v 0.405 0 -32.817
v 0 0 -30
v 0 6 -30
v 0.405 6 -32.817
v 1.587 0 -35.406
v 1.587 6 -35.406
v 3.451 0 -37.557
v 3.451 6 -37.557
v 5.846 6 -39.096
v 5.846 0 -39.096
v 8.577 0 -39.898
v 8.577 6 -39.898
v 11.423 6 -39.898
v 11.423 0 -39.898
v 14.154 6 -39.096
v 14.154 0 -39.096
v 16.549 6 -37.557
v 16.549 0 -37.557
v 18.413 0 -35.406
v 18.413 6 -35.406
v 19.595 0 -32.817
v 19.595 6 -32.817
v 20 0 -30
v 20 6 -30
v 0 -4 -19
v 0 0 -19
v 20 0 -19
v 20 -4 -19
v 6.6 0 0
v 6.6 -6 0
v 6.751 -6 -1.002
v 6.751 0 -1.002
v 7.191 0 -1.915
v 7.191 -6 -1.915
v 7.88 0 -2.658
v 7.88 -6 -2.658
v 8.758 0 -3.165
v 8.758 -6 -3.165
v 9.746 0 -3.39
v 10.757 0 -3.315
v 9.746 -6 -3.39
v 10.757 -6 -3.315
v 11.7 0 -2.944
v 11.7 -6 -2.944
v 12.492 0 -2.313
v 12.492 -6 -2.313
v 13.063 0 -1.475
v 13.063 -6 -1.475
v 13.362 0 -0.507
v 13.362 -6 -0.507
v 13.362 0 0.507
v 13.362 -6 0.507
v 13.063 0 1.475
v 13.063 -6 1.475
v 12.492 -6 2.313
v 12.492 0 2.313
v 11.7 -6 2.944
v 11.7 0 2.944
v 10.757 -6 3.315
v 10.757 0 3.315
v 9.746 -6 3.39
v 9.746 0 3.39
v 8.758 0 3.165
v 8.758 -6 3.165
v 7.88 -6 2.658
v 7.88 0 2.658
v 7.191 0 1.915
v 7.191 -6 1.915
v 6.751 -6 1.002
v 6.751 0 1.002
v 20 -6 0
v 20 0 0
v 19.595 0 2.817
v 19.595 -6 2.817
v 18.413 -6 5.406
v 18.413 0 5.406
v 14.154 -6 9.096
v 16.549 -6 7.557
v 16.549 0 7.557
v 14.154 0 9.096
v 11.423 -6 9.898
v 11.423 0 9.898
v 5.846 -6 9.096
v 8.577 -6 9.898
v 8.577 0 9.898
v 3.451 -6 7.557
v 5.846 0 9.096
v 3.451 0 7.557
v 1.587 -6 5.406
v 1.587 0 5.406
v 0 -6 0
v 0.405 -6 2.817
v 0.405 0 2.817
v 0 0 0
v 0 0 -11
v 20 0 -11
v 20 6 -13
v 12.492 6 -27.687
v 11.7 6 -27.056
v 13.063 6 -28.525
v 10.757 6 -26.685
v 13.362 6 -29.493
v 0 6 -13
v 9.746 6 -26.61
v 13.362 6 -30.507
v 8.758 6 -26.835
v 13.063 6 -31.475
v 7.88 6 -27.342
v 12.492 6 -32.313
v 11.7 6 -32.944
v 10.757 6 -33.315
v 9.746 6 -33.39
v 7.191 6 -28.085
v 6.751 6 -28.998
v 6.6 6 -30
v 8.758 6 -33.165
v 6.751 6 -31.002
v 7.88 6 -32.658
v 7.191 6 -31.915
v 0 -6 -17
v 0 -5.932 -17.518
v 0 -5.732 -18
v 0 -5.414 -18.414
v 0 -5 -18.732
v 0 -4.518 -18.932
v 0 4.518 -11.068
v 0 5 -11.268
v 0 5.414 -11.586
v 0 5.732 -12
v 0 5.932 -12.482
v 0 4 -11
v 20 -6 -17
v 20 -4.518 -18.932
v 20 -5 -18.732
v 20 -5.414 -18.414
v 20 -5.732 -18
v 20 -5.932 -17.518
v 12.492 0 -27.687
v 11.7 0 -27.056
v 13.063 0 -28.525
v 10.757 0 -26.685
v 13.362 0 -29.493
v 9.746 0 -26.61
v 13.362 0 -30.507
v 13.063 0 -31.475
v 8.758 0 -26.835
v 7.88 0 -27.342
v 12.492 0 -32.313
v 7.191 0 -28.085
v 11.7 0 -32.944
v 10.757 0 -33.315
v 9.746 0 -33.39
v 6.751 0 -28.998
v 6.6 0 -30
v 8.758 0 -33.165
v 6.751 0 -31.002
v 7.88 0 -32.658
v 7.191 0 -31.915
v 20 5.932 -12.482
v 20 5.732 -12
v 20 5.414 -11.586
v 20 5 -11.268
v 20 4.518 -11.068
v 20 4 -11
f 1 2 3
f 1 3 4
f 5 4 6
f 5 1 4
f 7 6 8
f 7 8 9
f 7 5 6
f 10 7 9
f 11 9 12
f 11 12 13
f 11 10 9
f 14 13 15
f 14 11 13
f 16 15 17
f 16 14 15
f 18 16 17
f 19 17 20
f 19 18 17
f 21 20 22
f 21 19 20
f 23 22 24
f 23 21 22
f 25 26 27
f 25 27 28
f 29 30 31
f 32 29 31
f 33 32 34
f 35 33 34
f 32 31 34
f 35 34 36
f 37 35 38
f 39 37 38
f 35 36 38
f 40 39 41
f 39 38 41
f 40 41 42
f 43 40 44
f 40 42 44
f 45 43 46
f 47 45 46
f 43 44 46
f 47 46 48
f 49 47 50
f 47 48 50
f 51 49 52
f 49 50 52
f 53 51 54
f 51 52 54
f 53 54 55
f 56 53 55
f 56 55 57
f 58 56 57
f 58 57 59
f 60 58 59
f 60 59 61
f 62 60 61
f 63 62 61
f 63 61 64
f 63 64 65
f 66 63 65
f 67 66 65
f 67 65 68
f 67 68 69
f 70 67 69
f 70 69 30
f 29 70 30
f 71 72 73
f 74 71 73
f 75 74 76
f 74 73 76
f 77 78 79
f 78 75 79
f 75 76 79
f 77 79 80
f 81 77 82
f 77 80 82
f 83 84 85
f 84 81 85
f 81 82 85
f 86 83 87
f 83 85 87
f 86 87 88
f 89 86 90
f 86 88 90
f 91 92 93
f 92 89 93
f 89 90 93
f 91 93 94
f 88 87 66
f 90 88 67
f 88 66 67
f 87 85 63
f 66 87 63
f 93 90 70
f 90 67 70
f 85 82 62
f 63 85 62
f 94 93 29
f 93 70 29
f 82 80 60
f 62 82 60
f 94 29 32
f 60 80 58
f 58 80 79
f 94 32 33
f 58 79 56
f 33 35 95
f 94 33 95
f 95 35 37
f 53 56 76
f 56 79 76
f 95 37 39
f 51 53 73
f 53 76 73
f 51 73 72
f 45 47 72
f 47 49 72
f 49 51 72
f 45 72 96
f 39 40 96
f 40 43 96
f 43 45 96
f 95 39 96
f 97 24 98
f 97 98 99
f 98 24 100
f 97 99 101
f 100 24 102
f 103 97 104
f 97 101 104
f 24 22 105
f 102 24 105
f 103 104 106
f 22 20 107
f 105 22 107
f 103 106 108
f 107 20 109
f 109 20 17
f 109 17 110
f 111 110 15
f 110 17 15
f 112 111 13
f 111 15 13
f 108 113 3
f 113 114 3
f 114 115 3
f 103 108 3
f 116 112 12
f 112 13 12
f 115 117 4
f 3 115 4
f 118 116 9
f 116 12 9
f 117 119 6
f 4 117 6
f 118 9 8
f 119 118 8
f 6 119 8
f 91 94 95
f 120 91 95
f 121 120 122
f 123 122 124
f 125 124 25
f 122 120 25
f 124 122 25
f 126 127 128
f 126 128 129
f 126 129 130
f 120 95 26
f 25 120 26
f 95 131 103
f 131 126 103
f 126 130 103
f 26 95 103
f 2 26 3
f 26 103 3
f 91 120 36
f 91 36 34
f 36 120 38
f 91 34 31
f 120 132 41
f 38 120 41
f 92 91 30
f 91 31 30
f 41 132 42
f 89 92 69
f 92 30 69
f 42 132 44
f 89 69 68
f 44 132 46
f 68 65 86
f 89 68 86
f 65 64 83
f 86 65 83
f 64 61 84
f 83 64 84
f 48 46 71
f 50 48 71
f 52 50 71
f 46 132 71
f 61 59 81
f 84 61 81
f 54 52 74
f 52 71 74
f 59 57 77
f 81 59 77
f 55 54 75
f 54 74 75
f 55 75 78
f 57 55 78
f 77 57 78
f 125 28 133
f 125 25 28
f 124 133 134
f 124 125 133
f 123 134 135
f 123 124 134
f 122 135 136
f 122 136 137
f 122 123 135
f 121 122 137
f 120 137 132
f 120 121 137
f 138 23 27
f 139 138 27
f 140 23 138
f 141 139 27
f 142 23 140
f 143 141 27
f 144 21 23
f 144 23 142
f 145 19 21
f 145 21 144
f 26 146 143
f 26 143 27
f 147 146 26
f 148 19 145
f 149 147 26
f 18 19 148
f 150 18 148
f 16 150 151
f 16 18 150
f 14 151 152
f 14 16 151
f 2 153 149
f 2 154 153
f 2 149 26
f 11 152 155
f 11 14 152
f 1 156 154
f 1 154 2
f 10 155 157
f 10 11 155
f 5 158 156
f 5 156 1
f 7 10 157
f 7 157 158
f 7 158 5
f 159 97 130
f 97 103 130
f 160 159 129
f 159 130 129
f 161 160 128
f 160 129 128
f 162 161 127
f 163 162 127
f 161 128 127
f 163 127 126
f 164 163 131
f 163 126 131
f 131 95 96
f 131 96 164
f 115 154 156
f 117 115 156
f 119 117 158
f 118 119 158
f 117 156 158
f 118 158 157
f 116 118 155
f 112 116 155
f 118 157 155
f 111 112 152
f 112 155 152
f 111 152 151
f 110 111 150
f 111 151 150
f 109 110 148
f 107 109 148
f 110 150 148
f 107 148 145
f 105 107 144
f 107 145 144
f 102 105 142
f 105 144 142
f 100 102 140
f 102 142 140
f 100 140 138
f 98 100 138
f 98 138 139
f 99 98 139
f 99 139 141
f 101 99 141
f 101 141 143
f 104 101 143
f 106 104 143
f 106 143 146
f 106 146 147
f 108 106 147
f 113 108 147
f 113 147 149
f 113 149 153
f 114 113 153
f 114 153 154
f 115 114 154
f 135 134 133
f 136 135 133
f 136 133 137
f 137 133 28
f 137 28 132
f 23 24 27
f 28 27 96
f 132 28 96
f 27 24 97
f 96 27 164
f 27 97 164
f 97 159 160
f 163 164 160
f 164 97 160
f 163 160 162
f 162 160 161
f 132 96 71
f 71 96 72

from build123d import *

# Parameters (mm, degrees)
BOSS_EXTRU_1_DEPTH      = 6
BOSS_EXTRU_2_DEPTH      = 12
ESQUISSE14_W            = 21
ESQUISSE14_H            = 6
ENL_V_MAT_EXTRU_2_DEPTH = 21
TROU_TARAUD_M81_D       = 6.8
TROU_TARAUD_M82_D       = 6.8
CONG_1_R                = 2


with BuildPart() as part:
    # Esquisse1 → Boss.-Extru.1 (new body)
    with BuildSketch(Plane(origin=(0, 0, 0), x_dir=(1, 0, 0), z_dir=(0, 1, 0))):
        with BuildLine():
            Line((0, 0), (0, 30))
            ThreePointArc((0, 30), (10, 40), (20, 30))
            Line((20, 30), (20, 0))
            ThreePointArc((20, 0), (10, -10), (0, 0))
        make_face()
    extrude(amount=BOSS_EXTRU_1_DEPTH)

    # Esquisse12 → Boss.-Extru.2 (add)
    with BuildSketch(Plane.XZ):
        with BuildLine():
            Line((0, -30), (20, -30))
            Line((20, -30), (20, 0))
            ThreePointArc((20, 0), (10, 10), (0, 0))
            Line((0, 0), (0, -30))
        make_face()
    extrude(amount=BOSS_EXTRU_2_DEPTH)

    # Esquisse14 → Enlèv. mat.-Extru.2 (cut, through all)
    with BuildSketch(Plane(origin=(20, 0, 0), x_dir=(0, 0, -1), z_dir=(1, 0, 0))):
        with Locations((0.5, 3)):
            Rectangle(ESQUISSE14_W, ESQUISSE14_H)
        Polygon((30, 0), (19, 0), (19, -6), (-10, -6), (-10, -12), (30, -12), align=None)
    extrude(amount=-ENL_V_MAT_EXTRU_2_DEPTH, mode=Mode.SUBTRACT)

    # Trou taraudé M81 (through all)
    with Locations(Plane(origin=(0, 6, 0), x_dir=(1, 0, 0), z_dir=(0, 1, 0))):
        with Locations((10, 30)):
            Hole(TROU_TARAUD_M81_D / 2)

    # Trou taraudé M82 (through all)
    with Locations(Plane(origin=(0, 0, 0), x_dir=(1, 0, 0), z_dir=(0, 1, 0))):
        with Locations((10, 0)):
            Hole(TROU_TARAUD_M82_D / 2)

    # Congé1
    cong_1_edges = [part.edges().sort_by_distance(p)[0] for p in [
        (10, -6, -19),
        (10, 6, -11),
    ]]
    fillet(cong_1_edges, radius=CONG_1_R)


solid = part.part
